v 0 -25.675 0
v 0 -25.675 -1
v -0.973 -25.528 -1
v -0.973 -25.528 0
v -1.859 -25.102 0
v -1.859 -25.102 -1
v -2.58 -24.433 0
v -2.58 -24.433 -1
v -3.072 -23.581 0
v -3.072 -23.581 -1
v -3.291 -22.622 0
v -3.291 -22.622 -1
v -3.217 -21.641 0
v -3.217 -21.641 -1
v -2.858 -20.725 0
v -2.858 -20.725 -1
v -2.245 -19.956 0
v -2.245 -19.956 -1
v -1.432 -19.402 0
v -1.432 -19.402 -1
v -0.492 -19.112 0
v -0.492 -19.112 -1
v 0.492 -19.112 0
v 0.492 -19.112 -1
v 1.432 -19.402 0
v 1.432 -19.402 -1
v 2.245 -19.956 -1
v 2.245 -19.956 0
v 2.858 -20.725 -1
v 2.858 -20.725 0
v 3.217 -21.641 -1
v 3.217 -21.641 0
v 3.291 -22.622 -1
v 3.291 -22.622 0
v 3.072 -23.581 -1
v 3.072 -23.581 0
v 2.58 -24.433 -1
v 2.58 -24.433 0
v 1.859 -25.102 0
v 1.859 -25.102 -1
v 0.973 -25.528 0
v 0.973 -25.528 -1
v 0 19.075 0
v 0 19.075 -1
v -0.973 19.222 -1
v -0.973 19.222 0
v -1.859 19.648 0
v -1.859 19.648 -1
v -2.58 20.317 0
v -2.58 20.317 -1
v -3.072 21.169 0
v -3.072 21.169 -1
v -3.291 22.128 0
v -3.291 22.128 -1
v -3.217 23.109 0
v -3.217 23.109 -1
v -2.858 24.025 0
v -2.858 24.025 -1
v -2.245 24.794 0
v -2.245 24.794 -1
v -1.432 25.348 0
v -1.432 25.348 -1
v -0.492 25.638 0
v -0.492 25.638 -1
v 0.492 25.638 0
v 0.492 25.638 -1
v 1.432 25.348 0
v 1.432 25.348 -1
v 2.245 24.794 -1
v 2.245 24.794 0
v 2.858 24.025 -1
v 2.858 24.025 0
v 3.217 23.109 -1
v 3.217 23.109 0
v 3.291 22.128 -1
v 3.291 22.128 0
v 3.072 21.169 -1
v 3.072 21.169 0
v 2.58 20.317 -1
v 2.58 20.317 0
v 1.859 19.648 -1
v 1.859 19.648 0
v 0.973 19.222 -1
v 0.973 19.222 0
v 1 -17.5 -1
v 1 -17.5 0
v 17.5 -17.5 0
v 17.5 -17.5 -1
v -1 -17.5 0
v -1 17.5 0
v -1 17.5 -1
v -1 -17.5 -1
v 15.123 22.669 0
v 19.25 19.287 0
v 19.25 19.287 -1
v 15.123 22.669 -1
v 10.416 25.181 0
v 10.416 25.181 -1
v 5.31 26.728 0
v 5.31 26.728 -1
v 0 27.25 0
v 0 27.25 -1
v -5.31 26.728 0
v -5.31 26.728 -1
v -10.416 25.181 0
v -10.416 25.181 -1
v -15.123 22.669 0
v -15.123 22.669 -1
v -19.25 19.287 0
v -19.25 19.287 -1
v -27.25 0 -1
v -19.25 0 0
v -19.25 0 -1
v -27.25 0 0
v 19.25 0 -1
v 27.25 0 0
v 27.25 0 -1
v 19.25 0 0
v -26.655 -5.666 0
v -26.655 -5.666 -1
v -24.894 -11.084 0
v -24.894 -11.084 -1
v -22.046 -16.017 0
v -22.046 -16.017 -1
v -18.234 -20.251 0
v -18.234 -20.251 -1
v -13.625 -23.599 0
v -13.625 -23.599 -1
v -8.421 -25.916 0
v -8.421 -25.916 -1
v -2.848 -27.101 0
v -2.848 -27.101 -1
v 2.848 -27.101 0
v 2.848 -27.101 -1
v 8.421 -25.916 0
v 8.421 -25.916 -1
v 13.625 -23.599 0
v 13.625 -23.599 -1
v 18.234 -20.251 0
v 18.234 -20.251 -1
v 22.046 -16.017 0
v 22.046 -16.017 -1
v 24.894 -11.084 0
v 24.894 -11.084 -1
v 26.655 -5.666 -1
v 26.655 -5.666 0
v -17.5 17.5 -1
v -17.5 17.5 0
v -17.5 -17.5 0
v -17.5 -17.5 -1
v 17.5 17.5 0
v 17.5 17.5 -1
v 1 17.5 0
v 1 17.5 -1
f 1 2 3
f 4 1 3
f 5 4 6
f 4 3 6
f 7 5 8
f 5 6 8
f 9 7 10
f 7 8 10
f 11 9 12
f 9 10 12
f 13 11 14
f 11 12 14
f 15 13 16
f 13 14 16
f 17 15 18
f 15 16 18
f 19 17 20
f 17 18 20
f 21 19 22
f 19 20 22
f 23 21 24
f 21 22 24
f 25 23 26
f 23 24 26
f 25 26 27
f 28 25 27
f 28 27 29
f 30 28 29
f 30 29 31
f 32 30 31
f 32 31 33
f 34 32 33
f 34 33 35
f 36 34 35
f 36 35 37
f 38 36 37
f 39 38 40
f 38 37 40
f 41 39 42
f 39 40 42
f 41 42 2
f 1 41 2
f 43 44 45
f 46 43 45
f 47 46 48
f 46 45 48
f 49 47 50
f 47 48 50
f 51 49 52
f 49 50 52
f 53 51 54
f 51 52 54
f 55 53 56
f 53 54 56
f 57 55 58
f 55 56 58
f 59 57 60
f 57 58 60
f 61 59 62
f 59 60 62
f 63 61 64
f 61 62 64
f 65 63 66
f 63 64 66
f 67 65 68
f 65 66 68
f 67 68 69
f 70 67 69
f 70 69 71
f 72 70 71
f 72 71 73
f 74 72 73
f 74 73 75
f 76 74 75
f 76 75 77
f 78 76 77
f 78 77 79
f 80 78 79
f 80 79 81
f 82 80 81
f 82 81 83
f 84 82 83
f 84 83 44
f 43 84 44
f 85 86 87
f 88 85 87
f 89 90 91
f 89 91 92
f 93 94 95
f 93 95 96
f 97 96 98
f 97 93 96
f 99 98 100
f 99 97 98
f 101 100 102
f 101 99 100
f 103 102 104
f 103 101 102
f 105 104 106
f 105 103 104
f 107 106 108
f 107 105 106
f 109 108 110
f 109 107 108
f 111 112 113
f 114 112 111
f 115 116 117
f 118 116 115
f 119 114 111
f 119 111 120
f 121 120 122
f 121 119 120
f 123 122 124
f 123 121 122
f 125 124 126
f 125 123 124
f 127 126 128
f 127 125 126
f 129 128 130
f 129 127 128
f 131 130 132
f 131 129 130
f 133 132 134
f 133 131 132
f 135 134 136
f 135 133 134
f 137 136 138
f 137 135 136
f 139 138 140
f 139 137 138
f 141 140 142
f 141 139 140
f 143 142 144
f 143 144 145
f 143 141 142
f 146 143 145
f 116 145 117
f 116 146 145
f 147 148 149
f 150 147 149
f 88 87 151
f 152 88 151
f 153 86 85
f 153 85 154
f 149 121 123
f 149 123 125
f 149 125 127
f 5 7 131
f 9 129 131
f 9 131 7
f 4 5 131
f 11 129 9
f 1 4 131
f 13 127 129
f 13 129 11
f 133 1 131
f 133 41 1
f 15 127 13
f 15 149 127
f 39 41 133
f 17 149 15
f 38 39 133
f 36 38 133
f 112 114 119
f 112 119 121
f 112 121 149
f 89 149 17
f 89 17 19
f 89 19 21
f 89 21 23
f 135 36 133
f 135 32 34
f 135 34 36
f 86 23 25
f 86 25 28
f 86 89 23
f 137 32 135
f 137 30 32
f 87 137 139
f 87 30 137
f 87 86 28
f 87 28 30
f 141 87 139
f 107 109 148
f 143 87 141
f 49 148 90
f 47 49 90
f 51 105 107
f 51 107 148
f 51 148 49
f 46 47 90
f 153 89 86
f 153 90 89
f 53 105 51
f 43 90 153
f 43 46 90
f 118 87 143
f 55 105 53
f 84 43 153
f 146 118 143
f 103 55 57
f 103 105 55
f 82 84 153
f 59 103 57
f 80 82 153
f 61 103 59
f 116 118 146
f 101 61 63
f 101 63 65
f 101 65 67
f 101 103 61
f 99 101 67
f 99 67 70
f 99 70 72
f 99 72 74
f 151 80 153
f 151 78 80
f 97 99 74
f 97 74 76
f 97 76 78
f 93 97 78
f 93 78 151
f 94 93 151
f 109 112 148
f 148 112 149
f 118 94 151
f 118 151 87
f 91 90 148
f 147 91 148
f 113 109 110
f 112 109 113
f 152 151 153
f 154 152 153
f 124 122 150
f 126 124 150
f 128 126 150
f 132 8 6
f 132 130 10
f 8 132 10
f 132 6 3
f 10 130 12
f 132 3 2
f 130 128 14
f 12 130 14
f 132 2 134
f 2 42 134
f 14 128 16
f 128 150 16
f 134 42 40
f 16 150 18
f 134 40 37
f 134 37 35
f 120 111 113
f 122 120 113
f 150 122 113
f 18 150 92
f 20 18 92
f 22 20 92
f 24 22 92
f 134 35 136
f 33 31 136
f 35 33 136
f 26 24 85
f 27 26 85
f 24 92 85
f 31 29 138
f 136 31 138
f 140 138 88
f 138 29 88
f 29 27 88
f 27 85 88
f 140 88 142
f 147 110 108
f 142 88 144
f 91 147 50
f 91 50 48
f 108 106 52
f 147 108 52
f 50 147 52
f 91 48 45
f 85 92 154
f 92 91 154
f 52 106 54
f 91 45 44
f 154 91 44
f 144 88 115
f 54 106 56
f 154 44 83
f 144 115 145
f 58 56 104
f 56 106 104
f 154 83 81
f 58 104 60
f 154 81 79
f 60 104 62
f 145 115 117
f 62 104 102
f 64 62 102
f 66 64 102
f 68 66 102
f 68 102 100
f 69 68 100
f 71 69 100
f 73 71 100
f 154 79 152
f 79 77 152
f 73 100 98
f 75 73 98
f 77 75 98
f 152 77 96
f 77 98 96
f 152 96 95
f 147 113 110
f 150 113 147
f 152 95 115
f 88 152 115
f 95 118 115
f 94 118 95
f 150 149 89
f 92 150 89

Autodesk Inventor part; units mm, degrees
ref_plane "YZ Plane" through (0, 0, 0) normal (1, 0, 0) x (0, 1, 0)
ref_plane "XZ Plane" through (0, 0, 0) normal (0, 1, 0) x (-1, 0, 0)
ref_plane "XY Plane" through (0, 0, 0) normal (0, 0, 1) x (1, 0, 0)
sketch "スケッチ1" plane through (0, 0, 0) normal (0, 0, 1) x (1, 0, 0)
  circle A0 centre (0, 0) radius 27.25
  line L0 (17.5, 17.5) -> (-17.5, 17.5)
  line L1 (-17.5, 17.5) -> (-17.5, -17.5)
  line L2 (-17.5, -17.5) -> (17.5, -17.5)
  line L3 (17.5, -17.5) -> (17.5, 17.5)
  line L4 (17.5, 17.5) -> (-17.5, -17.5) construction
  line L5 (-17.5, 17.5) -> (17.5, -17.5) construction
  line L6 (1, 17.5) -> (-1, 17.5)
  line L7 (-1, 17.5) -> (-1, -17.5)
  line L8 (-1, -17.5) -> (1, -17.5)
  line L9 (1, -17.5) -> (1, 17.5)
  line L10 (1, 17.5) -> (-1, -17.5) construction
  line L11 (-1, 17.5) -> (1, -17.5) construction
  point P0 (1, -17.5)
  point P1 (1, 17.5)
  point P2 (-1, 17.5)
  point P3 (-1, -17.5)
  dimension "d0" = 54.5
  dimension "d6" = 35
  dimension "d107" = 2
  dimension "d108" = 35
extrude "押し出し1" add sketch "スケッチ1" against normal blind 1 contours A0 | L9 L2 L7 L0
sketch "スケッチ2" plane through (0, 0, 0) normal (0, 0, 1) x (1, 0, 0)
  line L0 (0, 42.4511) -> (0, -37.5489)
  line L1 (38.0038, 0) -> (-41.9962, 0)
  line L2 (27.25, 42.0143) -> (27.25, -37.9857)
  circle A0 centre (0, 0) radius 27.25 projected
  line L3 (17.5, 17.5) -> (17.5, -17.5) projected
  line L4 (19.25, 25) -> (27.25, 25)
  line L5 (27.25, 25) -> (27.25, -25)
  line L6 (27.25, -25) -> (19.25, -25)
  line L7 (19.25, -25) -> (19.25, 25)
  line L8 (19.25, 25) -> (27.25, -25) construction
  line L9 (27.25, 25) -> (19.25, -25) construction
  point P0 (17.5, 0)
  point P1 (23.25, 0)
  point P2 (19.25, 0)
  point P3 (27.25, 0)
  dimension "d13" = 9.75
  dimension "d14" = 8
  dimension "d15" = 50
  dimension "d19" = 54.5
  dimension "d110" = 1.75
extrude "押し出し2" cut sketch "スケッチ2" against normal blind 10 contours L7 L4 L2 A0 | A0 L1 L7 picked at (20.3822, 11.481)
mirror "ミラー1" about plane through (0, 0, 0) normal (1, 0, 0) of "押し出し2"
sketch "スケッチ8" plane through (0, 0, 0) normal (0, 0, 1) x (1, 0, 0)
  circle A0 centre (0, 0) radius 22.375
  circle A1 centre (0, 0) radius 27.25
  line L0 (0, 31.1603) -> (0, -30.8706)
  point P0 (0, 0)
  point P1 (0, 22.375)
  point P2 (0, -22.375)
  dimension "d112" = 44.75
  dimension "d113" = 54.5
hole "穴5" at (0, 22.375, 0) at (0, -22.375, 0) direction (0, 0, -1) diameter 6.6 end through all clearance for "Countersunk Flat Head Screw ISO 2009/7046" size "M6" standard "ISO"
properties part number "Part3_A_Y" material "鋼、軟鋼"
